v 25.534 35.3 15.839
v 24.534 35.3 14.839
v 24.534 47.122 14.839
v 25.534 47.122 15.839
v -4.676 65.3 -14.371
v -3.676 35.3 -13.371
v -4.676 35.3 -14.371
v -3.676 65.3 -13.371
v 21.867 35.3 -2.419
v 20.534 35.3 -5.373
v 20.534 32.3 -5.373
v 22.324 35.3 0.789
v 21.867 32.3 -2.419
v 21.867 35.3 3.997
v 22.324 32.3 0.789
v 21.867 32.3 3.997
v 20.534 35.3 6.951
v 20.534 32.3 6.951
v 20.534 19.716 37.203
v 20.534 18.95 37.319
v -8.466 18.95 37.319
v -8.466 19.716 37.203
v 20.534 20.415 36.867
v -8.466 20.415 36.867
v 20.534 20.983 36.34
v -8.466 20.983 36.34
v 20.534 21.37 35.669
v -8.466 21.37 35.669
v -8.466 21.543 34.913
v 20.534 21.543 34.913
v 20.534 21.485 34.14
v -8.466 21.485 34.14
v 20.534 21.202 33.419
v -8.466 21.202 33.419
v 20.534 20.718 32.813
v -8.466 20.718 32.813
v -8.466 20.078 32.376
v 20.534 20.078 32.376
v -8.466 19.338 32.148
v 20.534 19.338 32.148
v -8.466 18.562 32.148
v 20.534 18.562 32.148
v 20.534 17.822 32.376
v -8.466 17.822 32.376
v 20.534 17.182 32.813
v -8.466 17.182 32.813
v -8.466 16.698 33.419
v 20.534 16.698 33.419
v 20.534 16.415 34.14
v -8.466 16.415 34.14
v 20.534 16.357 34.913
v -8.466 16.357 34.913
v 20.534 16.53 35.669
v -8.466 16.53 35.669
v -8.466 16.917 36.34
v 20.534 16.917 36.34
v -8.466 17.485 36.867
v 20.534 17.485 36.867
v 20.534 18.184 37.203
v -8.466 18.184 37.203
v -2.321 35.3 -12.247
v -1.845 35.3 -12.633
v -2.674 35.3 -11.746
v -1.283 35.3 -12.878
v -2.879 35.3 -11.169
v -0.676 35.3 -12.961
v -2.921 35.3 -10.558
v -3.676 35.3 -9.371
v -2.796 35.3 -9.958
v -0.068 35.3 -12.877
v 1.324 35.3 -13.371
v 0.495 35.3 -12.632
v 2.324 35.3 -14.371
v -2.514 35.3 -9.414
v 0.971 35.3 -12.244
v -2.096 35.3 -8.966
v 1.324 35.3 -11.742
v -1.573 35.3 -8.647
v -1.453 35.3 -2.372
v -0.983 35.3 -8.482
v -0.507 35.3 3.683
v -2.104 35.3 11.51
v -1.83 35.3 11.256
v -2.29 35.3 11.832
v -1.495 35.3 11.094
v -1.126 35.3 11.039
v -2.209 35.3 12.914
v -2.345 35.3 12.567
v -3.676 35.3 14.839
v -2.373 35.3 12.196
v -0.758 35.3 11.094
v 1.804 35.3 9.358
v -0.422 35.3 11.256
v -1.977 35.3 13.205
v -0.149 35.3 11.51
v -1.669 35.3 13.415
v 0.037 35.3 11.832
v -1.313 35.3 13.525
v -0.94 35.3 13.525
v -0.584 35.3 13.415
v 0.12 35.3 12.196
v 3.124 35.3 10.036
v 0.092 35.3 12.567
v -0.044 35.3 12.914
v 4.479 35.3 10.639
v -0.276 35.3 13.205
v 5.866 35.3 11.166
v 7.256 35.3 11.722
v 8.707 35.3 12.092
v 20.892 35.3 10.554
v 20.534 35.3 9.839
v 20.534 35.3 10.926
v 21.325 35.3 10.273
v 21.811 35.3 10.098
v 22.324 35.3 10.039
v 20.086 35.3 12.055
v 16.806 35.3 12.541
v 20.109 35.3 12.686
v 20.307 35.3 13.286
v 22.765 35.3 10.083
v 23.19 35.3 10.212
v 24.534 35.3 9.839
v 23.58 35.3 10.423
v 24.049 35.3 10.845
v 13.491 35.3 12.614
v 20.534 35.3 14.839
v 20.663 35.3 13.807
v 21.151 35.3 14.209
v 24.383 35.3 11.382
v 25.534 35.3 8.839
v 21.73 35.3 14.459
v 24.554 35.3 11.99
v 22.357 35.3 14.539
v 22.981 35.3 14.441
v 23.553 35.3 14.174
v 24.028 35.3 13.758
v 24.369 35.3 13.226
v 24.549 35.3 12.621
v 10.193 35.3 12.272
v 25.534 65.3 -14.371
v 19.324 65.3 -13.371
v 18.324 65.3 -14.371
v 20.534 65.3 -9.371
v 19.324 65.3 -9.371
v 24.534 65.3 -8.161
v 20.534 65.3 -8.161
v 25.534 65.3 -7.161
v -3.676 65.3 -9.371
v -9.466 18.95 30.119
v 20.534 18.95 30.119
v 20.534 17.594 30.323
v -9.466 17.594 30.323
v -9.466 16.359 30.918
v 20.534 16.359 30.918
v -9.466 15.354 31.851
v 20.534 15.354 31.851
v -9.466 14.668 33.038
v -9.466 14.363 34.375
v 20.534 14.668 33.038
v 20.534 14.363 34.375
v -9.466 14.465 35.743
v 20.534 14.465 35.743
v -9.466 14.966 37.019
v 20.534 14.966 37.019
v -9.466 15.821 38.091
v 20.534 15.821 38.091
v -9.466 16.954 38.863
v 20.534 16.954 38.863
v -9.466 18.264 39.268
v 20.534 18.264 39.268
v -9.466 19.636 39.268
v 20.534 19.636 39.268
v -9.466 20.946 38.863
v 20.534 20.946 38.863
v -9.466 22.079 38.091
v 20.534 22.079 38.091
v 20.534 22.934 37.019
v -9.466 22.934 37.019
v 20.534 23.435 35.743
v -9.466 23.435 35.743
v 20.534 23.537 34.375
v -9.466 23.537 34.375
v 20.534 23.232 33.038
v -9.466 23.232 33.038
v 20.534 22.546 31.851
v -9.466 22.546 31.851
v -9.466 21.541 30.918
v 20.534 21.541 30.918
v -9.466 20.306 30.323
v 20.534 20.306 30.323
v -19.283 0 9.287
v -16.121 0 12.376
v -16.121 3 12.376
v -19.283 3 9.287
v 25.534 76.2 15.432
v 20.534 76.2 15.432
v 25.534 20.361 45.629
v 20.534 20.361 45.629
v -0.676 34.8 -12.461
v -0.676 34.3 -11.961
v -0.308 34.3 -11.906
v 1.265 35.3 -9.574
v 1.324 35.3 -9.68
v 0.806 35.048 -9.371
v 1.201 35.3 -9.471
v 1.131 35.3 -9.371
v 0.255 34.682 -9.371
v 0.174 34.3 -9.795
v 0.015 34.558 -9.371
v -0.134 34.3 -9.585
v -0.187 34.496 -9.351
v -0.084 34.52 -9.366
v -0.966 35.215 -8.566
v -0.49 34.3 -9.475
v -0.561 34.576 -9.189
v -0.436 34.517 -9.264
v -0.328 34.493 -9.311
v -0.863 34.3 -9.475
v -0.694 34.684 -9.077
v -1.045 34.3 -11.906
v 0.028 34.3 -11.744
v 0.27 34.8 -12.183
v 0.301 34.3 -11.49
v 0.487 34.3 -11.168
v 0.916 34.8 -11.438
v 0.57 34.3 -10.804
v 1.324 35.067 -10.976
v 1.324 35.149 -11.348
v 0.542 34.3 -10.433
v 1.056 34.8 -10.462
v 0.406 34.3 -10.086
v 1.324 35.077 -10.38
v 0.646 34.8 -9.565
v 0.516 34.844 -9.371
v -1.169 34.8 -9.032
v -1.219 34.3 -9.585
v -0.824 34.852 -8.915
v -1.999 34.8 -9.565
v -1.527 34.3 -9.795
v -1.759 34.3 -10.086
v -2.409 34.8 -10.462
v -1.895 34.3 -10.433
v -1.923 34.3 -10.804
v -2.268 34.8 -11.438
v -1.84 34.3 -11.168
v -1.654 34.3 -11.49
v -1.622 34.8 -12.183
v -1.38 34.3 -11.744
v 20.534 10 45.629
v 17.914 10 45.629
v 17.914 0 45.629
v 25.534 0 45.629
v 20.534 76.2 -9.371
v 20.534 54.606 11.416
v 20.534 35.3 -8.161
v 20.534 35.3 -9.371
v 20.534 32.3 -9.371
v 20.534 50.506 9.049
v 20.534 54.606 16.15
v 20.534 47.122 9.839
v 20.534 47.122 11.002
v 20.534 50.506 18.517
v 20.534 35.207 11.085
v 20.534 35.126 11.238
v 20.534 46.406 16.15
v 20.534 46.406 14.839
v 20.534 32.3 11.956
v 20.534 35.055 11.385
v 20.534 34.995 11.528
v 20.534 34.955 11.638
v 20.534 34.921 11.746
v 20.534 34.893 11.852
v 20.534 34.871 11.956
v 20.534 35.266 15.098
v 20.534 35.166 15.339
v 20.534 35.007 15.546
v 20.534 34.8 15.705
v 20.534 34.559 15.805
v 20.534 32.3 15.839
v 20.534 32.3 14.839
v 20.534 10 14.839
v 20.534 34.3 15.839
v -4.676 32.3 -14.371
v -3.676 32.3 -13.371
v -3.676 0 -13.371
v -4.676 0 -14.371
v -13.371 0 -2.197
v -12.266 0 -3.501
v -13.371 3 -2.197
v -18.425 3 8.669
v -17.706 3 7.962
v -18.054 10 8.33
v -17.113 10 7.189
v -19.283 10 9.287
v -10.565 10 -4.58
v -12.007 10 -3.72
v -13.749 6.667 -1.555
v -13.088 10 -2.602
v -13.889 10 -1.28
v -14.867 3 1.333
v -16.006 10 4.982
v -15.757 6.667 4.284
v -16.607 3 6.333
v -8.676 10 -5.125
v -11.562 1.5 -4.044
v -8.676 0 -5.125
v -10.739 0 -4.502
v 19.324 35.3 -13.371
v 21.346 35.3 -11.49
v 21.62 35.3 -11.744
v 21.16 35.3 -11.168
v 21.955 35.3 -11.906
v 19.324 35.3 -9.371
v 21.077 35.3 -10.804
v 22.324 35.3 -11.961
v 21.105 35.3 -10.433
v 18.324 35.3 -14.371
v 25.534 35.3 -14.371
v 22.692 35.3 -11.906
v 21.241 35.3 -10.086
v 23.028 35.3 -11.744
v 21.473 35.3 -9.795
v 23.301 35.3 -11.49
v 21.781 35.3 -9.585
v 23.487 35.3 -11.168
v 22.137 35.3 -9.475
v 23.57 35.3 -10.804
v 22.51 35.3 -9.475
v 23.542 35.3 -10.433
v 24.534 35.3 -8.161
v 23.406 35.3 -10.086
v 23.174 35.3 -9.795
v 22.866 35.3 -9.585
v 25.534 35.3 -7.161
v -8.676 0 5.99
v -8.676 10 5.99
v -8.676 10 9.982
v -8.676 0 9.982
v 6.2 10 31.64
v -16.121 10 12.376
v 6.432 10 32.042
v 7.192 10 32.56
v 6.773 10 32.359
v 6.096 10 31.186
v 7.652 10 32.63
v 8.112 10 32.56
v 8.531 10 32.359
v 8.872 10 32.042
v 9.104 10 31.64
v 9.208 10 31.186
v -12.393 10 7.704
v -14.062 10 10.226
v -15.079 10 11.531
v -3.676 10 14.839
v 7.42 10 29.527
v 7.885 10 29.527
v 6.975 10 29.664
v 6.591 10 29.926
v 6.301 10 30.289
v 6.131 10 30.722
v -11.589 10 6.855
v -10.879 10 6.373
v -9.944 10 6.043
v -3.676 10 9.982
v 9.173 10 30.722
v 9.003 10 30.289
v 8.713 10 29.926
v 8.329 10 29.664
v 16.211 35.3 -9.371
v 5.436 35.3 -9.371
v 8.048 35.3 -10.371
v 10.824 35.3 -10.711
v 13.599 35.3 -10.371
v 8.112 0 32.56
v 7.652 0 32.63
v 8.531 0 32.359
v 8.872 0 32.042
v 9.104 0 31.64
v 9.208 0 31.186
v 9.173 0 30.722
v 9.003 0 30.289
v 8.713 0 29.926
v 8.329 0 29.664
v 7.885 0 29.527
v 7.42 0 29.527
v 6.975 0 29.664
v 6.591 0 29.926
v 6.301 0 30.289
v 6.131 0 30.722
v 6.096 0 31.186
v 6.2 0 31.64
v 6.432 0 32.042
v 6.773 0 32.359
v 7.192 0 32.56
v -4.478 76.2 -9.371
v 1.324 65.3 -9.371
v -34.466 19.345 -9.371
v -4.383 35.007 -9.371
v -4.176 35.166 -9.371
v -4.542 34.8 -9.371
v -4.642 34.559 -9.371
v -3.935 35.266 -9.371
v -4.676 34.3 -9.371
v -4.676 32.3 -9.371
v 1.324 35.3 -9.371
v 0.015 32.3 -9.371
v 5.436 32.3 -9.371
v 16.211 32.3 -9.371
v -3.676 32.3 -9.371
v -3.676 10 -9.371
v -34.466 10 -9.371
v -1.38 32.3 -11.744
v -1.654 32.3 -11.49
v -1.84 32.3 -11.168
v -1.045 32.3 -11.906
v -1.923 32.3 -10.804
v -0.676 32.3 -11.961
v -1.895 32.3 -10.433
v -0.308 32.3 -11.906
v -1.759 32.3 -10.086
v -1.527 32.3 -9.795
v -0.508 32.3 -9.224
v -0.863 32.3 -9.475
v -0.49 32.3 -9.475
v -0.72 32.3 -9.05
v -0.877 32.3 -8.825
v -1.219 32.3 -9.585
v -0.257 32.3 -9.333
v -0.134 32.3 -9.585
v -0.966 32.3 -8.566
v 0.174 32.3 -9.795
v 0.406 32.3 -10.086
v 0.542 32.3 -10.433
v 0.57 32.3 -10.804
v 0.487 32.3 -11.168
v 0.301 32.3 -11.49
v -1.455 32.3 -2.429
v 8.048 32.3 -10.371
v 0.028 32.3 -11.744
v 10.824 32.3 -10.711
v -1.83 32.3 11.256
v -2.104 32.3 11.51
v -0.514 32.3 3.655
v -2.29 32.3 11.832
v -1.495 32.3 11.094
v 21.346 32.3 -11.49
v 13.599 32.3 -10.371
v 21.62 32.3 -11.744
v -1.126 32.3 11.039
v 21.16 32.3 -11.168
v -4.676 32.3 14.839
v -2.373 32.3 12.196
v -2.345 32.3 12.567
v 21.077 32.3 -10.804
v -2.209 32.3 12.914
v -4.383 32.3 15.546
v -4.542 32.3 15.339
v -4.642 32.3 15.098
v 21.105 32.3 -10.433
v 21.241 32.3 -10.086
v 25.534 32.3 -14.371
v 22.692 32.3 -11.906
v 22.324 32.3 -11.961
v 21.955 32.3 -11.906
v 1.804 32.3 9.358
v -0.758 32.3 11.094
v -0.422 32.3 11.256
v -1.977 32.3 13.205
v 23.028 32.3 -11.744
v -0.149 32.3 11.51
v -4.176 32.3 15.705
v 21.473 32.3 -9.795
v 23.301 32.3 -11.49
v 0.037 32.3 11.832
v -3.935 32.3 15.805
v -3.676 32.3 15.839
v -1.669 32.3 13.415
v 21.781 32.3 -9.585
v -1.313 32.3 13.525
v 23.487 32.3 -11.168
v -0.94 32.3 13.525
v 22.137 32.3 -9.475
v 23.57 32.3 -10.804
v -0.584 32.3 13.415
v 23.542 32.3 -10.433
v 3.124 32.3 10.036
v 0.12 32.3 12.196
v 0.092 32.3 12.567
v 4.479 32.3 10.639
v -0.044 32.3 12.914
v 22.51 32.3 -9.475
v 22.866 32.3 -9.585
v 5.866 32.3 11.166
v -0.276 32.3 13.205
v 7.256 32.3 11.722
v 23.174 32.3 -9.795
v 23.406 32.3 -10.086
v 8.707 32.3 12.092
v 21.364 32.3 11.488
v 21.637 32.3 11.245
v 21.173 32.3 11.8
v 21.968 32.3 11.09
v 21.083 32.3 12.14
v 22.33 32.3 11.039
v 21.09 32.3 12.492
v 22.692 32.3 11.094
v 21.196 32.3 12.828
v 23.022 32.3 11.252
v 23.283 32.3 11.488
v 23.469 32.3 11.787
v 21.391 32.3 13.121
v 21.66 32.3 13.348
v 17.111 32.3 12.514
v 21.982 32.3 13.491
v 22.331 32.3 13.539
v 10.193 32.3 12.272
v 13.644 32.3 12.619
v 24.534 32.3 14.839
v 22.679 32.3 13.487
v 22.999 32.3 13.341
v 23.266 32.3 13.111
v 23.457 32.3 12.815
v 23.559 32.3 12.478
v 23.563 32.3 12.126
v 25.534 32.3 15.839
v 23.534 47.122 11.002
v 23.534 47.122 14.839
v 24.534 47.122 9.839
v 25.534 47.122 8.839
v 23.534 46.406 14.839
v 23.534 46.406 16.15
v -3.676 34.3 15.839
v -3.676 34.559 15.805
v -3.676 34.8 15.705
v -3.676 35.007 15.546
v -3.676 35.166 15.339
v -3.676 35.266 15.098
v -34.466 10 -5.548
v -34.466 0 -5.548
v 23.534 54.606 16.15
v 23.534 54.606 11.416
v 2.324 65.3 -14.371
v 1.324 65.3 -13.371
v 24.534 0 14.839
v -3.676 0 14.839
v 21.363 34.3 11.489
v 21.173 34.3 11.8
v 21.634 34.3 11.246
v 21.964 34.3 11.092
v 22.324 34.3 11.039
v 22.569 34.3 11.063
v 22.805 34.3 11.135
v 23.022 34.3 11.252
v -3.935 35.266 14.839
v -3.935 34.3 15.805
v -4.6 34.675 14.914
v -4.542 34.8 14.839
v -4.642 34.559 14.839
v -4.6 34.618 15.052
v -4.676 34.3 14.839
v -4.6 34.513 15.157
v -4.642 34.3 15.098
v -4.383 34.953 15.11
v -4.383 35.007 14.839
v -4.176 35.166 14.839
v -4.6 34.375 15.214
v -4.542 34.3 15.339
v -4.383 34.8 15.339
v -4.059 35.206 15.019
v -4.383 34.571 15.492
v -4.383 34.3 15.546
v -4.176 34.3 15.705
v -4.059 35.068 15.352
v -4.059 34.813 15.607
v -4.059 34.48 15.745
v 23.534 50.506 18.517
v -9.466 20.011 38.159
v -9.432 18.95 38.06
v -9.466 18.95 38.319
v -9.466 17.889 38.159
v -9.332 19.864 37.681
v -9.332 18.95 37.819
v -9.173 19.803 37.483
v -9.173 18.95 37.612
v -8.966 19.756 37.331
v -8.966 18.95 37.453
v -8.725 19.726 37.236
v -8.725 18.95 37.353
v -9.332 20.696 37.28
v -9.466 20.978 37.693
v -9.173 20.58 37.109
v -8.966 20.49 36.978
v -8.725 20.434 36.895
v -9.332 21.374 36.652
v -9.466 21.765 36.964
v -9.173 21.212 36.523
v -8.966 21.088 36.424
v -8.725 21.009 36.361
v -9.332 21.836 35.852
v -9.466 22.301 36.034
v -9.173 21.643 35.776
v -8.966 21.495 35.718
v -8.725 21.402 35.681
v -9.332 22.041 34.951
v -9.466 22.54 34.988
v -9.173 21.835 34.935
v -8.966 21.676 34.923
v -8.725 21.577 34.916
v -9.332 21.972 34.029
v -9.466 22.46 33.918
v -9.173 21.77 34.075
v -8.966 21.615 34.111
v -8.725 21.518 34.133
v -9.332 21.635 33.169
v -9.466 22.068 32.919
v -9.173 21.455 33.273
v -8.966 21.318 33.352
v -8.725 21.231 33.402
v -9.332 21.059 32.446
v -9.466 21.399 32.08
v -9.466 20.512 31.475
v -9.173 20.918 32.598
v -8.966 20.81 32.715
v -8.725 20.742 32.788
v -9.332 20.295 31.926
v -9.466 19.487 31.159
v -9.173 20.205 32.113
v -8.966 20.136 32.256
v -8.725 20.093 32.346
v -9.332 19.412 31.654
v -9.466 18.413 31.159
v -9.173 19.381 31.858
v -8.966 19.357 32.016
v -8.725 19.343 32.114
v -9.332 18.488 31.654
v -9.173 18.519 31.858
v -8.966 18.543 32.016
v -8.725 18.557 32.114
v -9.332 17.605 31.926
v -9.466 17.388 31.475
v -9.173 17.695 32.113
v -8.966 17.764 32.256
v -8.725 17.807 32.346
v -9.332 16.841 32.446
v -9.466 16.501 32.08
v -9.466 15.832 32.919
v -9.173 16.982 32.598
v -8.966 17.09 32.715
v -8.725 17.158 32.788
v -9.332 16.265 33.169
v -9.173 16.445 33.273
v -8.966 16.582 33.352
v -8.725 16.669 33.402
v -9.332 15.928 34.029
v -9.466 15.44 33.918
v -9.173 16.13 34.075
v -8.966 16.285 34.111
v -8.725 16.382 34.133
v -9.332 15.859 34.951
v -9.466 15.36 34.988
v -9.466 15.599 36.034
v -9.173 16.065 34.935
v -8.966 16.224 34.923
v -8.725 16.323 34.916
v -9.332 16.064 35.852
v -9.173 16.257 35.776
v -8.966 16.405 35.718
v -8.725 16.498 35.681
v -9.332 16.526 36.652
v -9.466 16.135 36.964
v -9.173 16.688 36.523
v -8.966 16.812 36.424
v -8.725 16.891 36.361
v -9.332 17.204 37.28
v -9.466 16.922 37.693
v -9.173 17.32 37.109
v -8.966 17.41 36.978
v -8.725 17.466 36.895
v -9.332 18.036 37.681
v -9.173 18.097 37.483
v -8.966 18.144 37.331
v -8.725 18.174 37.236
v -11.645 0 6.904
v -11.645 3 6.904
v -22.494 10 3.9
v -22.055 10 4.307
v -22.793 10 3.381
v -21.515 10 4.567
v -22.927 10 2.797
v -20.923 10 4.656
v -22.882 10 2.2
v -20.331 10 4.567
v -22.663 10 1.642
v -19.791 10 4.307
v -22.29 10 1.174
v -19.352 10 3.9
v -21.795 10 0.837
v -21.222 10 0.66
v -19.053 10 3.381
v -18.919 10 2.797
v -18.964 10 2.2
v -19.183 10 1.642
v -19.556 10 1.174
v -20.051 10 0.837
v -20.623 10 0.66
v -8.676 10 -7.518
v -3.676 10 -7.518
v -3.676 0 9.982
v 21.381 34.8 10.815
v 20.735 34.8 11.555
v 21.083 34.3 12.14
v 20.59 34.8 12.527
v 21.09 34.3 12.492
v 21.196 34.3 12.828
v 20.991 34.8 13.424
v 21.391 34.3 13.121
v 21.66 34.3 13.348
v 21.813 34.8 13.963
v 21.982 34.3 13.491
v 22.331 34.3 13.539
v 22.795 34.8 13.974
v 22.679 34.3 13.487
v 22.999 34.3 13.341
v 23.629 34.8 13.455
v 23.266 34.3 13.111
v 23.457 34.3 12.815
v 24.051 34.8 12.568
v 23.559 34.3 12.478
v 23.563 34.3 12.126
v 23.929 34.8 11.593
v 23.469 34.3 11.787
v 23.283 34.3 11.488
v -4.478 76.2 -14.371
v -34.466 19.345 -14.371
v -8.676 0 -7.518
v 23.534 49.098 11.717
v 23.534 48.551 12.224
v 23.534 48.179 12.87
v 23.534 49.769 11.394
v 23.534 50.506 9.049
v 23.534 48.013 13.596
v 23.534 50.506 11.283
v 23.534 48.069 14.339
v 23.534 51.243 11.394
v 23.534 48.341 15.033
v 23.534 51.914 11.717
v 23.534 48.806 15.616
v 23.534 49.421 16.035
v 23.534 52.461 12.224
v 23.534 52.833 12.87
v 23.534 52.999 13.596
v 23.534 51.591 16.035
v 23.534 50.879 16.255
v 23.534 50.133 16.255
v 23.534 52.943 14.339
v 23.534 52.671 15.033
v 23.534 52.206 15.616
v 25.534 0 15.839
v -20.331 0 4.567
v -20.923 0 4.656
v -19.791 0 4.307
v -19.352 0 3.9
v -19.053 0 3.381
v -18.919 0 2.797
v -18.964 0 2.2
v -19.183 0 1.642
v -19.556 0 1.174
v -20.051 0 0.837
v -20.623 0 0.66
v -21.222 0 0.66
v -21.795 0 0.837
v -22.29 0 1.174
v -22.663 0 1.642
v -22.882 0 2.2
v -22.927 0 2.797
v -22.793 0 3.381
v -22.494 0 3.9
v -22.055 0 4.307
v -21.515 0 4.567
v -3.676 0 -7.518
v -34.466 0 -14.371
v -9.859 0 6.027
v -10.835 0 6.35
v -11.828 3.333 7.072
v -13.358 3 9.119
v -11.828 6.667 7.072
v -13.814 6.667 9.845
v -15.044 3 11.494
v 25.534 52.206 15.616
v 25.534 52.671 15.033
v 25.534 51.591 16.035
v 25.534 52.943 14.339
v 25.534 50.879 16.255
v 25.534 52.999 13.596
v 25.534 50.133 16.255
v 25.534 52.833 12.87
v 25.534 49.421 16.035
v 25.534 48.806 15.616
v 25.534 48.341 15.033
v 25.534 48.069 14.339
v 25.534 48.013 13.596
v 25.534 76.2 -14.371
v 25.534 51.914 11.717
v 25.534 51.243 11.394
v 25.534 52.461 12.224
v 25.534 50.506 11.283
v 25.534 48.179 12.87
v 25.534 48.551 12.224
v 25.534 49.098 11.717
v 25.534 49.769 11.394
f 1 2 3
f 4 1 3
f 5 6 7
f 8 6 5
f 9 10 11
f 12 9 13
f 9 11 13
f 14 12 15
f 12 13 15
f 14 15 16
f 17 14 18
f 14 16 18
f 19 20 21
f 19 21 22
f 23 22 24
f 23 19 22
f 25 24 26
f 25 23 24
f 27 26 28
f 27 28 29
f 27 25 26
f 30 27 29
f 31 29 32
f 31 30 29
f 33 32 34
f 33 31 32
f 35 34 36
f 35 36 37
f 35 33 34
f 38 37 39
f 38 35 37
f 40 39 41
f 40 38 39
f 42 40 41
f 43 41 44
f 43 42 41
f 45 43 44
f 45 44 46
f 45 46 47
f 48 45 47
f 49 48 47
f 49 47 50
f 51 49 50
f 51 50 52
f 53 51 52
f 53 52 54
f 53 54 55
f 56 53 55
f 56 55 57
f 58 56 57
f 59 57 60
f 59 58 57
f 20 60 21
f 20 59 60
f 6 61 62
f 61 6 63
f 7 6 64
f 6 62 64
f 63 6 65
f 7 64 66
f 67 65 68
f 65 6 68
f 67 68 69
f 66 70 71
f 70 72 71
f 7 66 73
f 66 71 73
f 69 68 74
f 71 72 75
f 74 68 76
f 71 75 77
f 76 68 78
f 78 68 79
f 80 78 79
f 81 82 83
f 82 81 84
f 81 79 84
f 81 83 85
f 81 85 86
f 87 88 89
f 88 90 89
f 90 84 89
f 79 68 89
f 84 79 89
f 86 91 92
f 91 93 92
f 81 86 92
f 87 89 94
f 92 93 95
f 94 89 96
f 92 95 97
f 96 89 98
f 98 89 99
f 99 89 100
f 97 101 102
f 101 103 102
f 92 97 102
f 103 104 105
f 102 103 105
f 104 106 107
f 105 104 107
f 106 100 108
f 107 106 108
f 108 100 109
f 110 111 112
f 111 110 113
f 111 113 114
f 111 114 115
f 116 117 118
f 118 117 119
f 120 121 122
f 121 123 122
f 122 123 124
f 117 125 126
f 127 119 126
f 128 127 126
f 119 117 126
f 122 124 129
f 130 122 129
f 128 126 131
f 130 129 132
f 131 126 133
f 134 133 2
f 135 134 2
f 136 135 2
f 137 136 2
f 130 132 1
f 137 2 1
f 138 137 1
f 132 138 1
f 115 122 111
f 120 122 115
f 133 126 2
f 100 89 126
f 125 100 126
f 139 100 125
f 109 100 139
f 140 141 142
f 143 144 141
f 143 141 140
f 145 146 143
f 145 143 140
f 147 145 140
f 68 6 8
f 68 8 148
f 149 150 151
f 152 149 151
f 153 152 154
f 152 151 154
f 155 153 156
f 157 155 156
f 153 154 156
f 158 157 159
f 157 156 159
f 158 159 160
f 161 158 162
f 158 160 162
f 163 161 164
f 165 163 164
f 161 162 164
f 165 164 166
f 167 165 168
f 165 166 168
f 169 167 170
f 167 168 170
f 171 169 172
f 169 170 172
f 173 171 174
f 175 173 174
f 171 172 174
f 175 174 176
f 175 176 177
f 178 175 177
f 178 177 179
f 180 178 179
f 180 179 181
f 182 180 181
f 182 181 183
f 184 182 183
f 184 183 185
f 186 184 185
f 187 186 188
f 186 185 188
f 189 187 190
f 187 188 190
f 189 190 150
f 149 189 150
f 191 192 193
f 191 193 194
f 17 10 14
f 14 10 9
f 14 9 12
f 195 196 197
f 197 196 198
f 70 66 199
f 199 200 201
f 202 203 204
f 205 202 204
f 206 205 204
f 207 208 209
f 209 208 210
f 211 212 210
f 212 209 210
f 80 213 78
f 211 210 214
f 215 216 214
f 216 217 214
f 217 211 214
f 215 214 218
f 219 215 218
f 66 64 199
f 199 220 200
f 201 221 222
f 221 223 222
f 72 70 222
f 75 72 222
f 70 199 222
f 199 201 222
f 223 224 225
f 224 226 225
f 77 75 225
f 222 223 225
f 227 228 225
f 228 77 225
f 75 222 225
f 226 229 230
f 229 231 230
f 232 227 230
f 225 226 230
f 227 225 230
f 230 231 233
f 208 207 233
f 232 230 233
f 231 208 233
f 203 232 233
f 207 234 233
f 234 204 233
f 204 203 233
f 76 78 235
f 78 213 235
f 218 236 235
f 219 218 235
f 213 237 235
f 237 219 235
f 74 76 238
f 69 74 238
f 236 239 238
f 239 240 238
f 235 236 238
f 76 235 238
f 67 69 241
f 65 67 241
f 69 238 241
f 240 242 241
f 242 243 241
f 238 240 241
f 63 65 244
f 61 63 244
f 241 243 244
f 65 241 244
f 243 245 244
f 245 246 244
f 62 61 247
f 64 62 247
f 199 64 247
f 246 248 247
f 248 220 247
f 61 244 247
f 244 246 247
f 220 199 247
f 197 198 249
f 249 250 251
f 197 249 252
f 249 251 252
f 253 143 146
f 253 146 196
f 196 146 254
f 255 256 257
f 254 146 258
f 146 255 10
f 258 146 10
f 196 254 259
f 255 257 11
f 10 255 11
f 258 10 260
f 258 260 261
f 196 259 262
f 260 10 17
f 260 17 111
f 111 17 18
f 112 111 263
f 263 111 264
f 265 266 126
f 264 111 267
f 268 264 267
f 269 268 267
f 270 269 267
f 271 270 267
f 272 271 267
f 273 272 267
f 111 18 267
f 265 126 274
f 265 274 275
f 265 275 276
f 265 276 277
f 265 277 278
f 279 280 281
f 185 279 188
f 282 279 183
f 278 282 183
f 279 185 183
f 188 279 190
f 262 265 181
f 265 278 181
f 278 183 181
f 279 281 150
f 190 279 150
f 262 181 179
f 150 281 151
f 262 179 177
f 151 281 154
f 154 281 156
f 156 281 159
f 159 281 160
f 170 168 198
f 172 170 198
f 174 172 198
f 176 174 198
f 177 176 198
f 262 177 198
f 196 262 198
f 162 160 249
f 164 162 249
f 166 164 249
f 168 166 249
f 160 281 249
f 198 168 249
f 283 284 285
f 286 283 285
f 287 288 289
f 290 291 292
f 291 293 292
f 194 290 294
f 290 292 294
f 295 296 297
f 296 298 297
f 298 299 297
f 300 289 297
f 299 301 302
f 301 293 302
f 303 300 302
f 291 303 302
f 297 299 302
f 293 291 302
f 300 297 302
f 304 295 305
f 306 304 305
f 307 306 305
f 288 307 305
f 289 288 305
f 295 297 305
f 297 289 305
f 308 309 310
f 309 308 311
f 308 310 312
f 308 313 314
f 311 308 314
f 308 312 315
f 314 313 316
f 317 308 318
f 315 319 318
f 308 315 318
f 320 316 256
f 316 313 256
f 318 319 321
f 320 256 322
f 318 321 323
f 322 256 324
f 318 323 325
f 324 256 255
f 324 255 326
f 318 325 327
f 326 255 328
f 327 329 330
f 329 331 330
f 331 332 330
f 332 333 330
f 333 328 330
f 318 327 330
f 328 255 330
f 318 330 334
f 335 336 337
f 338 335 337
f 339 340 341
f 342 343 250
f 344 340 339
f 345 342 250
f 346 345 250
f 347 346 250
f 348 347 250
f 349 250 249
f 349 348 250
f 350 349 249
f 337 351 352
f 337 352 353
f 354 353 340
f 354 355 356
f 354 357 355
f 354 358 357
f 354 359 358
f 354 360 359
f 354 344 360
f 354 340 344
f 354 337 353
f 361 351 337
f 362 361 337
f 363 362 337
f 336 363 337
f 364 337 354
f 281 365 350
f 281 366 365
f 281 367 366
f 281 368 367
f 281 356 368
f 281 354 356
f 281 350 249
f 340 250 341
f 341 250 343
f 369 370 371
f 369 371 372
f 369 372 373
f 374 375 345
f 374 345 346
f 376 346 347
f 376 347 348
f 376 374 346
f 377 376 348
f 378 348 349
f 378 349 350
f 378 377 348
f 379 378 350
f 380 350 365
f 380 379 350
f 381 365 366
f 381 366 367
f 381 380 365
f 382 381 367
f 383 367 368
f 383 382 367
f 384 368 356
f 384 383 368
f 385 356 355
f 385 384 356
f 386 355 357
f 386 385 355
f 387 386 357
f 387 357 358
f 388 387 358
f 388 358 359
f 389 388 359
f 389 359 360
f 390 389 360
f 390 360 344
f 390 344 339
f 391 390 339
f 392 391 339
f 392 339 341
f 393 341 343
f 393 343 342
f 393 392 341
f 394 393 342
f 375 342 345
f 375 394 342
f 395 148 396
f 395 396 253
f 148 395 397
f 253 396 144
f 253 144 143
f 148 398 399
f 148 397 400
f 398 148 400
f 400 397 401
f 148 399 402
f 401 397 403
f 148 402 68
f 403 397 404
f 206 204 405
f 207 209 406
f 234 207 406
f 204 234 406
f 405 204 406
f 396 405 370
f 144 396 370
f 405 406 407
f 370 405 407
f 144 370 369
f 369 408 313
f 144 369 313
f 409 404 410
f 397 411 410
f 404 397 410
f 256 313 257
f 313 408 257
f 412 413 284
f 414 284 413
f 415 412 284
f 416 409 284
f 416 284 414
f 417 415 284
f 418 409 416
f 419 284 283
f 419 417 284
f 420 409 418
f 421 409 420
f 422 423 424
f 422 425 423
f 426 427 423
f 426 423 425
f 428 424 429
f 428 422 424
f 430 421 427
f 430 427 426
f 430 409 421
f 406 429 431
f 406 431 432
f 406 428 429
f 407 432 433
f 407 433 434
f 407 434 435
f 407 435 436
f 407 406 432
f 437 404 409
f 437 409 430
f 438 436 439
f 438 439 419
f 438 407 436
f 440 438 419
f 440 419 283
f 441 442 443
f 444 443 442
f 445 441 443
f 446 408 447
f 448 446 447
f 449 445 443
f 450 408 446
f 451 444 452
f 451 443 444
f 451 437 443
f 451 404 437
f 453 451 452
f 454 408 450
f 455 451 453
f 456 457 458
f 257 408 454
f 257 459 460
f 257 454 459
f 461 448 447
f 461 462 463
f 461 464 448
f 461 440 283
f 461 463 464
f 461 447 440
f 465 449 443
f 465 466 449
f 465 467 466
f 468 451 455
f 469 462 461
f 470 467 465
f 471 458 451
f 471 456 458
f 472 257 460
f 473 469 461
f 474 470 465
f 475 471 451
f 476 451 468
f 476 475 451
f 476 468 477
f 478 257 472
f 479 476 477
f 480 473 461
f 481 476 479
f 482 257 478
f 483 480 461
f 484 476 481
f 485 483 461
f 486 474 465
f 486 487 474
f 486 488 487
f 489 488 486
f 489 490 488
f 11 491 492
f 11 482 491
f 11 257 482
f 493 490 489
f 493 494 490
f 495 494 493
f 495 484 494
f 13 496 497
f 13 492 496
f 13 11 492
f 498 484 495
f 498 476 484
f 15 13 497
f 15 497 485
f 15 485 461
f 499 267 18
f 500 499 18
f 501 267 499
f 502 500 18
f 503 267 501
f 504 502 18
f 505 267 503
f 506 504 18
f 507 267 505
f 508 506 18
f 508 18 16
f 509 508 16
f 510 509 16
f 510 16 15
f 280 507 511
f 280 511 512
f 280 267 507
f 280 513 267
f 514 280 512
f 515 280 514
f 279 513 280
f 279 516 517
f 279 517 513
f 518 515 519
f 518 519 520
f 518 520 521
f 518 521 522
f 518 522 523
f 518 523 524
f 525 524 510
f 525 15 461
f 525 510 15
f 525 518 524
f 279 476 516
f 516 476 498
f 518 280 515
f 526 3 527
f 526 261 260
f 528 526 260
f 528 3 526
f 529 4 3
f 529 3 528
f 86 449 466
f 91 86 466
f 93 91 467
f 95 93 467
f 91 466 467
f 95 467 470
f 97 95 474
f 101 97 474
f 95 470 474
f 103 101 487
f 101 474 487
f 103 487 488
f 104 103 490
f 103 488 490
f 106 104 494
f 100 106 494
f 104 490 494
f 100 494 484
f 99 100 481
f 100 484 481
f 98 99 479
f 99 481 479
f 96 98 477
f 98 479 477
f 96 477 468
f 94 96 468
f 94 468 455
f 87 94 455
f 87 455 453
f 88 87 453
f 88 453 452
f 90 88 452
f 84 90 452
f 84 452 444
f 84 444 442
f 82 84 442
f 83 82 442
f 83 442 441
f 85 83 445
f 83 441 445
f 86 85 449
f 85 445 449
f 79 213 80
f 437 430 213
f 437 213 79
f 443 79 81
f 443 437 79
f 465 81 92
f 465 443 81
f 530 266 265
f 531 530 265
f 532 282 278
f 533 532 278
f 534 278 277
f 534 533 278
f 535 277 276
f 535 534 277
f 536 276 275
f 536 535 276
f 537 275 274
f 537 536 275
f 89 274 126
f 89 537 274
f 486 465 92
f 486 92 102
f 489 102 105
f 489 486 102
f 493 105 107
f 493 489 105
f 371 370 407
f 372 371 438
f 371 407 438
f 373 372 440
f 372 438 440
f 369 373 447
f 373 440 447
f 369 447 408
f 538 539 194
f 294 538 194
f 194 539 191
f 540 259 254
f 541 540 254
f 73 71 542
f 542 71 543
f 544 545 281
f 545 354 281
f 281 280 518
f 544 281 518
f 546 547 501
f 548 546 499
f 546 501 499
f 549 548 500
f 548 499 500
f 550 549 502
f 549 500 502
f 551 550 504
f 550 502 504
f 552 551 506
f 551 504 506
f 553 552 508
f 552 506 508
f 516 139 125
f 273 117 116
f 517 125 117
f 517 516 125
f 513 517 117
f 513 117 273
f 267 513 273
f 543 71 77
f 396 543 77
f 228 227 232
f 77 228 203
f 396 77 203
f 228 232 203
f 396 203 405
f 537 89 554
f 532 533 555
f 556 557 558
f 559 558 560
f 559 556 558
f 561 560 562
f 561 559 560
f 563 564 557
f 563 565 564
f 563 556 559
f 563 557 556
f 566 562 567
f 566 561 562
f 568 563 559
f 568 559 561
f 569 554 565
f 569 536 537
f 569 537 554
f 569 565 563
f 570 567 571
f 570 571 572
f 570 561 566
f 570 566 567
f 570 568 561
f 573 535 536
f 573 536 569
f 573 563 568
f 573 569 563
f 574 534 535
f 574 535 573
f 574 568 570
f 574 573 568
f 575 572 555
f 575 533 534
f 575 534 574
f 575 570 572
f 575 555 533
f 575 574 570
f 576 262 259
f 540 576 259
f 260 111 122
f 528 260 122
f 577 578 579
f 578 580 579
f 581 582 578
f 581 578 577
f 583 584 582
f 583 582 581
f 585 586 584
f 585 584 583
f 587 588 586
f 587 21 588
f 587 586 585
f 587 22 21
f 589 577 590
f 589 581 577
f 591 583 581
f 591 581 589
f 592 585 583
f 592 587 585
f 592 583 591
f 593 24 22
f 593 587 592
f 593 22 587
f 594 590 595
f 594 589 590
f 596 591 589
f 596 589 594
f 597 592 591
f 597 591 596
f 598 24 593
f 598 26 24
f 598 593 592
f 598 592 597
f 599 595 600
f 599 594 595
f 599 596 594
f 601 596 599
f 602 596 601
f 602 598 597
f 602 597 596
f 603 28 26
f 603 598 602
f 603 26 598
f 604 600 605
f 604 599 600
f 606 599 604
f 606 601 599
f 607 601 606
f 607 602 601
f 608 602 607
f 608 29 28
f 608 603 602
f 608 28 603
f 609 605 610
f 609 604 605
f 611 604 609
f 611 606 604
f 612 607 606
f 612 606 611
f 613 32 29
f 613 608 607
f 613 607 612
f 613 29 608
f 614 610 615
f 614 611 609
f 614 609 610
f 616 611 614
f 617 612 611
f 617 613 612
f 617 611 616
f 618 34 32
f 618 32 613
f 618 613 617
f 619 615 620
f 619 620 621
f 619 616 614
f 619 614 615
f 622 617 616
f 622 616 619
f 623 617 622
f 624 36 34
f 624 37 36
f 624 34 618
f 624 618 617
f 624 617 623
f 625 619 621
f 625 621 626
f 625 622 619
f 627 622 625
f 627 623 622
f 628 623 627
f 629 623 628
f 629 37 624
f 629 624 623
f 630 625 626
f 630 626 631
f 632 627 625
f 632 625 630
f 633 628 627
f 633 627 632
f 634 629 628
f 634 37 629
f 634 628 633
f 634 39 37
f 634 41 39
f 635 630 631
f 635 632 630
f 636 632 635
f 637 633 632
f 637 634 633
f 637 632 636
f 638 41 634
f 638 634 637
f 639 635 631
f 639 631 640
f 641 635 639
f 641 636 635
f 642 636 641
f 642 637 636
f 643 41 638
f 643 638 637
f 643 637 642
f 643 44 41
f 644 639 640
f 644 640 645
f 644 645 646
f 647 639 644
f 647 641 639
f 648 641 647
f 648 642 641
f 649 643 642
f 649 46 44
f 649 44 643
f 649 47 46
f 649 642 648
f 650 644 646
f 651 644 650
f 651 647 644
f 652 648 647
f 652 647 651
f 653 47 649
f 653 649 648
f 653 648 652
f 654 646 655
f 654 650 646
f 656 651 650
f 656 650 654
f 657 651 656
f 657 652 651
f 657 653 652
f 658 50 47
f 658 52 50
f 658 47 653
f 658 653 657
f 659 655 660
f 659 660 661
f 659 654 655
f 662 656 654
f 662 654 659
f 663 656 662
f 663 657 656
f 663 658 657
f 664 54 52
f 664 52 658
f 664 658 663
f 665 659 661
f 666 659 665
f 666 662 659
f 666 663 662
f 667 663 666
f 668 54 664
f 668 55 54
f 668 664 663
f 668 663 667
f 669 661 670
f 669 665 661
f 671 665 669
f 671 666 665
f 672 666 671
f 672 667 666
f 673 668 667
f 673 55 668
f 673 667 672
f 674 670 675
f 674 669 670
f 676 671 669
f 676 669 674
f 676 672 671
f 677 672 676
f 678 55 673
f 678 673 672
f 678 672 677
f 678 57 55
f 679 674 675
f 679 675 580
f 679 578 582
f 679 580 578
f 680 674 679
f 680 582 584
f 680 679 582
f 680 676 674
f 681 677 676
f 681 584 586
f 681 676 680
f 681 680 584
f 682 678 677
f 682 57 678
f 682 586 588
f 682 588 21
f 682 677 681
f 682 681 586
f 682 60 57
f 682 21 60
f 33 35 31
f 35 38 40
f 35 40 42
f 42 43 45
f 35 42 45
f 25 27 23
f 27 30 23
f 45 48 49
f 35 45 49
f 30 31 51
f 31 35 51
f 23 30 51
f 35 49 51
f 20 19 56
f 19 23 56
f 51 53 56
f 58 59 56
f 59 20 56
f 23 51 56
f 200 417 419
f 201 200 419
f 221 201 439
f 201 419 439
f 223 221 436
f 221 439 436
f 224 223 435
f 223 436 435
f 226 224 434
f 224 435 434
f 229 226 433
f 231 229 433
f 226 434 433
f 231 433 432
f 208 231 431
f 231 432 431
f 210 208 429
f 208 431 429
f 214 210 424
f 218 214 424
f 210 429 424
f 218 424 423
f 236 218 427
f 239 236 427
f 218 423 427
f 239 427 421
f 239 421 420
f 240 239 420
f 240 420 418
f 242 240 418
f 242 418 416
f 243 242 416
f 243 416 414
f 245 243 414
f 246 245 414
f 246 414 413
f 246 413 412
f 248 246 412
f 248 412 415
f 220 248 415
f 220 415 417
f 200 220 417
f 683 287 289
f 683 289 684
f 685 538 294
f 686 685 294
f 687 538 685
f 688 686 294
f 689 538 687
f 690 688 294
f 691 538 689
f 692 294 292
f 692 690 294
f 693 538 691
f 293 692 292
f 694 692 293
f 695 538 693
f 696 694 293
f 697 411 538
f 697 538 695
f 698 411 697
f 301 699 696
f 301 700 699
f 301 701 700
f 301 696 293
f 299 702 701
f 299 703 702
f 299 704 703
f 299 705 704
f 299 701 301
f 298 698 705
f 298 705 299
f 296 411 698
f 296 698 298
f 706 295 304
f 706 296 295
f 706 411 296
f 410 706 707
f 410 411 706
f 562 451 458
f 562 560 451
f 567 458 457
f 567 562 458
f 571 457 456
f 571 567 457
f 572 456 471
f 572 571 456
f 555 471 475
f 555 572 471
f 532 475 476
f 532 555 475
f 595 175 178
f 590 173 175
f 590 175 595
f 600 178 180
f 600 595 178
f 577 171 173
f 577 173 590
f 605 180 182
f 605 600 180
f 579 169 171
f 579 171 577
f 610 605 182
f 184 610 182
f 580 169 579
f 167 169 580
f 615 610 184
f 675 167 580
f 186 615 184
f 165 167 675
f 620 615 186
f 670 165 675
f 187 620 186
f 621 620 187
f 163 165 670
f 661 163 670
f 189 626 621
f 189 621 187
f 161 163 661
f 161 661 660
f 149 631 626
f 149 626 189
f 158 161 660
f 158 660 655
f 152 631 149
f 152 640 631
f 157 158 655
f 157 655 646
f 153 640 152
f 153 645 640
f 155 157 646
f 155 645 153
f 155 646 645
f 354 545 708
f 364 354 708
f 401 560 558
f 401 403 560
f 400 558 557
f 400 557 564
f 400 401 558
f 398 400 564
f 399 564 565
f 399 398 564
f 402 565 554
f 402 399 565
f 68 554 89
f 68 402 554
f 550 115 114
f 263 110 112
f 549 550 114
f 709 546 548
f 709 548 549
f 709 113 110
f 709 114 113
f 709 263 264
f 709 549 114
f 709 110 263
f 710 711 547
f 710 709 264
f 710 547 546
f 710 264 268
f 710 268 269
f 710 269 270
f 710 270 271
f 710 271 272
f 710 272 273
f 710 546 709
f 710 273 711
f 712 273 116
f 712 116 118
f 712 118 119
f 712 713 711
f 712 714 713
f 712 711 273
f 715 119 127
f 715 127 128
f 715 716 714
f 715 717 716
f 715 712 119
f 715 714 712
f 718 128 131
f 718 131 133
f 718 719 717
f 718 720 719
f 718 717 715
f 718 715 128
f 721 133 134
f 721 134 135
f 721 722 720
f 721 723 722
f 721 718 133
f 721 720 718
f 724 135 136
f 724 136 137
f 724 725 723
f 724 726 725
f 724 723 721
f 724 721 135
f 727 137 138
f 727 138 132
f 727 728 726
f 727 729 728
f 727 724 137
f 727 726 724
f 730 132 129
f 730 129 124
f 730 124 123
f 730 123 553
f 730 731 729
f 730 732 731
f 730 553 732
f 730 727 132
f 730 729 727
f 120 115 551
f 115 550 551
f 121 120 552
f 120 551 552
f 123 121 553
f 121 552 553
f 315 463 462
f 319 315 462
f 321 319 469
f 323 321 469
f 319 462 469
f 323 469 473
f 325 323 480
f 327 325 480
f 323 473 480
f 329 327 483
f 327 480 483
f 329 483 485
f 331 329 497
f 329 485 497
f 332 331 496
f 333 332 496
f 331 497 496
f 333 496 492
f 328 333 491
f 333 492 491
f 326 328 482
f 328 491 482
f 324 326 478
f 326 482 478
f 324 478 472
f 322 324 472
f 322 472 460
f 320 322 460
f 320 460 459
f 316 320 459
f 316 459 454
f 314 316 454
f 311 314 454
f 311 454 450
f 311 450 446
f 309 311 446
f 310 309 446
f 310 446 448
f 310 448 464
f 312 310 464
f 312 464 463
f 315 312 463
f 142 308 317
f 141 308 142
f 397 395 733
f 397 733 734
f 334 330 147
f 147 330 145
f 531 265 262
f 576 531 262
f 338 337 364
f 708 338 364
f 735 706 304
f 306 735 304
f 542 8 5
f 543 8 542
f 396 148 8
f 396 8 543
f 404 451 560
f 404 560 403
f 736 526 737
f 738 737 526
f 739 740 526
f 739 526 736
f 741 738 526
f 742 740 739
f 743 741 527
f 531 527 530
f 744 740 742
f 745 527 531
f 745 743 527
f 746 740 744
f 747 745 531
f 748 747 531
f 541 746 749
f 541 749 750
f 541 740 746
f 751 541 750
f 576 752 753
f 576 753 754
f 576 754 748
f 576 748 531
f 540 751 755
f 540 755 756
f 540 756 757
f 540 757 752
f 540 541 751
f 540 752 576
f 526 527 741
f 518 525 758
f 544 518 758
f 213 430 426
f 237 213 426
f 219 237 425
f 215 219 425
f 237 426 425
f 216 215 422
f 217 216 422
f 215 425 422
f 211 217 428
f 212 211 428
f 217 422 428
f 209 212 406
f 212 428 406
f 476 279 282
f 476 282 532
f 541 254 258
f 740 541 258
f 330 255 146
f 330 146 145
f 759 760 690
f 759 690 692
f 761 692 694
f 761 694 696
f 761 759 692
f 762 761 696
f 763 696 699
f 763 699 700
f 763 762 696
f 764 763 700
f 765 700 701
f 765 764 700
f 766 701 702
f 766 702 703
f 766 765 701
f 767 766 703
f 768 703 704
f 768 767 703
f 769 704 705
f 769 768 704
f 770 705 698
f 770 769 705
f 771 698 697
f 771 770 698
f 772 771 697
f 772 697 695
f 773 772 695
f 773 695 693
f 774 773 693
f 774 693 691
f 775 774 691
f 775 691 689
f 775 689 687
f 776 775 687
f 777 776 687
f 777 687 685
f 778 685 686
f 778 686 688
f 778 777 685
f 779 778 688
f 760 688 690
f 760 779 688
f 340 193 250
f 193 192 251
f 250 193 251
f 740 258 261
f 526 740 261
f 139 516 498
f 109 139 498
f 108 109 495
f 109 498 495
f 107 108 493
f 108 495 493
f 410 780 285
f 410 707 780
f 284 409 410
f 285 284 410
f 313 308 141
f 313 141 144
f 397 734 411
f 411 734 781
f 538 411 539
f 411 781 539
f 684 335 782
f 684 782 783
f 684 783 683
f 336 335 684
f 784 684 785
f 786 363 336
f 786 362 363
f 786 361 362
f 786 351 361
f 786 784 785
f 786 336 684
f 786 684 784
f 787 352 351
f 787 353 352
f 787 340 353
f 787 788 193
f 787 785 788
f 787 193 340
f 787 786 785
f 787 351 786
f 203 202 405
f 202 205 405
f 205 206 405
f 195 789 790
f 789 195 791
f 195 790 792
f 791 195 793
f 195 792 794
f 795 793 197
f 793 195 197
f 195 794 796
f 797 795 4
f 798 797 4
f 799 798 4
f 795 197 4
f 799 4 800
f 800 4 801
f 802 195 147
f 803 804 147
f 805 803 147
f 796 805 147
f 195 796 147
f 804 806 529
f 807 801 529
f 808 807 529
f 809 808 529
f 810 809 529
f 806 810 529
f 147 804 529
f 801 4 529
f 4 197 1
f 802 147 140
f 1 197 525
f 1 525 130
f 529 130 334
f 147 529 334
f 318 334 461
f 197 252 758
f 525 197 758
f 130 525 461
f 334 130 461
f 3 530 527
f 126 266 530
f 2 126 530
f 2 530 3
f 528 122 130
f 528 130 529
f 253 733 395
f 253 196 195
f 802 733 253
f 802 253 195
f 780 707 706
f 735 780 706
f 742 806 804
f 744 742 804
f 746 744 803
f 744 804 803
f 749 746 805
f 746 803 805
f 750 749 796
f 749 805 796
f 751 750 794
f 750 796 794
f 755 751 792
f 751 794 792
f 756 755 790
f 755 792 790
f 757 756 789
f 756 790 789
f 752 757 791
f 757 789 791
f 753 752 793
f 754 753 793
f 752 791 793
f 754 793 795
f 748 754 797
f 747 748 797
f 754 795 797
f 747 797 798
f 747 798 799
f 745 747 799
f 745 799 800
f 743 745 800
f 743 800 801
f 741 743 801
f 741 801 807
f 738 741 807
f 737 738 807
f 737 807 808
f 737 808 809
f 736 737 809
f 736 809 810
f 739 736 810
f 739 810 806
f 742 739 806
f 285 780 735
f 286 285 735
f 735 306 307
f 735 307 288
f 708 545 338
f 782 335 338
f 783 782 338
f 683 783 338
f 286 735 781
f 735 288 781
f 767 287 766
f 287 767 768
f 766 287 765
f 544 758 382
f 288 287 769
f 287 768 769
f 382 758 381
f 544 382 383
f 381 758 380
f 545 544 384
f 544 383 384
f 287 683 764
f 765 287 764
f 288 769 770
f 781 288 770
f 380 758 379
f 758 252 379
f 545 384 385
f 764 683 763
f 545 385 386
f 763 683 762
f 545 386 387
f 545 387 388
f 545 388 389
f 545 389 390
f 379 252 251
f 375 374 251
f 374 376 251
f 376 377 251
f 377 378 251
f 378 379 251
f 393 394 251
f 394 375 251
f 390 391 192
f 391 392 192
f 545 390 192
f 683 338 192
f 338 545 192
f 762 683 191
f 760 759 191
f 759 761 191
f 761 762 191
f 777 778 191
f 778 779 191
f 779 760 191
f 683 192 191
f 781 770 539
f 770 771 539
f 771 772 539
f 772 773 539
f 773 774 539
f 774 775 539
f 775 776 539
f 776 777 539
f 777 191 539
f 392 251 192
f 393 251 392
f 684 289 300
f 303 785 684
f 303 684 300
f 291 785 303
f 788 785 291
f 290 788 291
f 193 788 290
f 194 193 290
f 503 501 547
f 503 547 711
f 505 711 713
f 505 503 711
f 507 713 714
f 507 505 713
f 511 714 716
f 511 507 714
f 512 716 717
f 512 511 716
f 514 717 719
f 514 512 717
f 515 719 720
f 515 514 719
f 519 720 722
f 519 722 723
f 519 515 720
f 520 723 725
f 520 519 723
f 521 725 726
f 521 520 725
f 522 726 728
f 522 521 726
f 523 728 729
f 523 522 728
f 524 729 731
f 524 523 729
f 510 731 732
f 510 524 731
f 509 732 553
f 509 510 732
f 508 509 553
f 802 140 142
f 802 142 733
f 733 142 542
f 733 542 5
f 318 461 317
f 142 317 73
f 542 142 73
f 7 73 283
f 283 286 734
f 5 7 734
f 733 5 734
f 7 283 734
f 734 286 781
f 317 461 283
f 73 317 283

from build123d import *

# Parameters (mm, degrees)
SKETCH1_R                      = 1.560106864
SKETCH1_R_2                    = 2.009221825
BOSS_EXTRUDE1_DEPTH            = 10
BOSS_EXTRUDE3_START            = -10
BOSS_EXTRUDE3_DEPTH            = 76.2
CUT_EXTRUDE1_REACH             = 89.478
SKETCH4_W                      = 29.21
SKETCH4_H                      = 29.21
CUT_EXTRUDE1_DIRECTION_2_DEPTH = 22.3
CUT_EXTRUDE2_START             = -3
SKETCH5_W                      = 6.21
SKETCH5_H                      = 5
SKETCH5_W_2                    = 5
SKETCH5_H_2                    = 6.21
CUT_EXTRUDE2_DEPTH             = 30
CUT_EXTRUDE3_REACH             = 74.091
SKETCH6_R                      = 1.25
CHAMFER1_SIZE                  = 1
CUT_EXTRUDE4_REACH             = 102.097
CUT_EXTRUDE5_REACH             = 106.467
SKETCH9_R                      = 1.25
BOSS_EXTRUDE4_DEPTH            = 3
FILLET2_R                      = 1
SKETCH10_R                     = 11.5
CUT_EXTRUDE6_DEPTH             = 3
SKETCH12_R                     = 4.6
SKETCH12_R_2                   = 2.6
BOSS_EXTRUDE5_DEPTH            = 30
FILLET3_R                      = 1
CHAMFER2_SIZE                  = 1
BOSS_EXTRUDE6_REACH            = 109.184
SKETCH14_W                     = 12.395863616
SKETCH14_H                     = 18.726756054
SKETCH13_R                     = 2.5
CUT_EXTRUDE7_DEPTH             = 20
CUT_EXTRUDE8_DEPTH             = 3
CUT_EXTRUDE11_DEPTH            = 10
BOSS_EXTRUDE8_DEPTH            = 3


with BuildPart() as part:
    # Sketch1 → Boss-Extrude1 (new body)
    with BuildSketch(Plane(origin=(0, 0, 0), x_dir=(1, 0, 0), z_dir=(0, 1, 0))):
        Polygon((-34.466315789, 14.371052632), (-34.466315789, 5.547894737), (17.913684211, -45.628947368), (25.533684211, -45.628947368), (25.533684211, 14.371052632), align=None)
        with Locations(Location((7.652084211, -31.069547368, 0), (0, 0, 270))):
            Circle(SKETCH1_R, mode=Mode.SUBTRACT)
        with Locations(Location((-20.922915789, -2.646947368, 0), (0, 0, 270))):
            Circle(SKETCH1_R_2, mode=Mode.SUBTRACT)
    extrude(amount=BOSS_EXTRUDE1_DEPTH)

    # Sketch3 → Boss-Extrude3 (add)
    with BuildSketch(Plane(origin=(0, 10, 0), x_dir=(1, 0, 0), z_dir=(0, 1, 0)).offset(BOSS_EXTRUDE3_START)):
        Polygon((-34.466315789, 14.371052632), (-34.466315789, 9.371052632), (20.533684211, 9.371052632), (20.533684211, -45.628947368), (25.533684211, -45.628947368), (25.533684211, 14.371052632), align=None)
    extrude(amount=BOSS_EXTRUDE3_DEPTH)

    # Sketch4 → Cut-Extrude1 (cut, up to next)
    with BuildSketch(Plane(origin=(0, 10, 0), x_dir=(1, 0, 0), z_dir=(0, 1, 0)), mode=Mode.PRIVATE) as cut_extrude1_sk1:
        with Locations((10.928684211, -0.233947368)):
            Rectangle(SKETCH4_W, SKETCH4_H)
    cut_extrude1_tool1 = extrude(cut_extrude1_sk1.sketch, amount=-CUT_EXTRUDE1_REACH, mode=Mode.PRIVATE) & part.part
    add(cut_extrude1_tool1.solids().sort_by_distance((10.928684, 10, 0.233947))[0], mode=Mode.SUBTRACT)

    # Sketch4 → Cut-Extrude1 direction 2 (cut)
    with BuildSketch(Plane(origin=(0, 10, 0), x_dir=(1, 0, 0), z_dir=(0, 1, 0))):
        with Locations((10.928684211, -0.233947368)):
            Rectangle(SKETCH4_W, SKETCH4_H)
    extrude(amount=CUT_EXTRUDE1_DIRECTION_2_DEPTH, mode=Mode.SUBTRACT)

    # Sketch5 → Cut-Extrude2 (cut)
    with BuildSketch(Plane.XZ.offset(-32.3).offset(CUT_EXTRUDE2_START)):
        with Locations((22.428684211, 12.338947368)):
            Rectangle(SKETCH5_W, SKETCH5_H)
        with Locations((-1.176315789, -11.266052632)):
            Rectangle(SKETCH5_W_2, SKETCH5_H_2)
        with Locations((22.428684211, -11.266052632)):
            Rectangle(SKETCH5_W, SKETCH5_H_2)
    extrude(amount=-CUT_EXTRUDE2_DEPTH, mode=Mode.SUBTRACT)

    # Sketch6 → Cut-Extrude3 (cut, up to next)
    with BuildSketch(Plane.XZ.offset(-32.3), mode=Mode.PRIVATE) as cut_extrude3_sk1:
        with Locations(Location((22.323684211, 12.288947368, 0), (0, 0, 270))):
            Circle(SKETCH6_R)
    cut_extrude3_tool1 = extrude(cut_extrude3_sk1.sketch, amount=-CUT_EXTRUDE3_REACH, mode=Mode.PRIVATE) & part.part
    # Sketch6 → Cut-Extrude3 (cut, up to next)
    with BuildSketch(Plane.XZ.offset(-32.3), mode=Mode.PRIVATE) as cut_extrude3_sk2:
        with Locations(Location((22.323684211, -10.711052632, 0), (0, 0, 270))):
            Circle(SKETCH6_R)
    cut_extrude3_tool2 = extrude(cut_extrude3_sk2.sketch, amount=-CUT_EXTRUDE3_REACH, mode=Mode.PRIVATE) & part.part
    # Sketch6 → Cut-Extrude3 (cut, up to next)
    with BuildSketch(Plane.XZ.offset(-32.3), mode=Mode.PRIVATE) as cut_extrude3_sk3:
        with Locations(Location((-0.676315789, -10.711052632, 0), (0, 0, 270))):
            Circle(SKETCH6_R)
    cut_extrude3_tool3 = extrude(cut_extrude3_sk3.sketch, amount=-CUT_EXTRUDE3_REACH, mode=Mode.PRIVATE) & part.part
    add(cut_extrude3_tool1.solids().sort_by_distance((22.323684, 32.3, 12.288947))[0], mode=Mode.SUBTRACT)
    add(cut_extrude3_tool2.solids().sort_by_distance((22.323684, 32.3, -10.711053))[0], mode=Mode.SUBTRACT)
    add(cut_extrude3_tool3.solids().sort_by_distance((-0.676316, 32.3, -10.711053))[0], mode=Mode.SUBTRACT)

    # Chamfer1
    chamfer1_edges = [part.edges().sort_by_distance(p)[0] for p in [
        (19.323684211, 50.3, -14.371052632),
        (25.533684211, 50.3, -8.161052632),
        (-3.676315789, 50.3, -14.371052632),
        (1.323684211, 50.3, -14.371052632),
        (25.533684211, 16.15, 14.838947368),
        (-3.676315789, 16.15, -14.371052632),
        (25.533684211, 50.3, 9.838947368),
        (25.533684211, 50.3, 14.838947368),
    ]]
    chamfer(chamfer1_edges, length=CHAMFER1_SIZE)

    # Sketch7 → Cut-Extrude4 (cut, up to next)
    with BuildSketch(Plane.XY.offset(-9.371052632), mode=Mode.PRIVATE) as cut_extrude4_sk1:
        Polygon((-4.478138481, 76.2), (-34.466315789, 19.345490892), (-34.466315789, 76.2), align=None)
    cut_extrude4_tool1 = extrude(cut_extrude4_sk1.sketch, amount=-CUT_EXTRUDE4_REACH, mode=Mode.PRIVATE) & part.part
    add(cut_extrude4_tool1.solids().sort_by_distance((-24.470257, 57.248497, -9.371053))[0], mode=Mode.SUBTRACT)

    # Sketch8 → Cut-Extrude5 (cut, up to next)
    with BuildSketch(Plane.ZY.offset(-20.533684211), mode=Mode.PRIVATE) as cut_extrude5_sk1:
        Polygon((45.628947368, 76.2), (15.432121686, 76.2), (45.628947368, 20.360875822), align=None)
    cut_extrude5_tool1 = extrude(cut_extrude5_sk1.sketch, amount=-CUT_EXTRUDE5_REACH, mode=Mode.PRIVATE) & part.part
    add(cut_extrude5_tool1.solids().sort_by_distance((20.533684, 57.586959, 35.563339))[0], mode=Mode.SUBTRACT)

    # Sketch9 → Boss-Extrude4 (add)
    with BuildSketch(Plane.XZ.offset(-32.3)):
        with BuildLine():
            Line((-4.676315789, 15.838947368), (-4.676315789, -14.371052632))
            Line((-4.676315789, -14.371052632), (0.900761385, -14.371052632))
            ThreePointArc((0.900761385, -14.371052632), (0.366362818, -13.109171958), (-0.102099011, -11.821356685))
            ThreePointArc((-0.102099011, -11.821356685), (-1.878735883, -11.052645838), (-0.771600032, -9.464689557))
            ThreePointArc((-0.771600032, -9.464689557), (-1.228222209, 0.185593043), (1.804207587, 9.358423992))
            ThreePointArc((1.804207587, 9.358423992), (11.255772005, 12.427491579), (21.173303455, 11.799944181))
            ThreePointArc((21.173303455, 11.799944181), (22.678913505, 13.487409779), (23.021780943, 11.252047686))
            ThreePointArc((23.021780943, 11.252047686), (24.290349599, 10.788966069), (25.533684211, 10.261870194))
            Line((25.533684211, 10.261870194), (25.533684211, 15.838947368))
            Line((25.533684211, 15.838947368), (-4.676315789, 15.838947368))
        make_face()
        with Locations(Location((-1.126315789, 12.288947368, 0), (0, 0, 270))):
            Circle(SKETCH9_R, mode=Mode.SUBTRACT)
    extrude(amount=-BOSS_EXTRUDE4_DEPTH)

    # Fillet2
    fillet2_edges = [part.edges().sort_by_distance(p)[0] for p in [
        (7.928684211, 35.3, 15.838947368),
        (-4.676315789, 35.3, 3.233947368),
        (-4.676315789, 33.8, 15.838947368),
        (-0.793400855, 33.8, -9.371052632),
    ]]
    fillet(fillet2_edges, radius=FILLET2_R)

    # Sketch10 → Cut-Extrude6 (cut)
    with BuildSketch(Plane.XZ.offset(-32.3)):
        with Locations((10.823684211, 0.788947368)):
            Circle(SKETCH10_R)
    extrude(amount=-CUT_EXTRUDE6_DEPTH, mode=Mode.SUBTRACT)

    # Sketch12 → Boss-Extrude5 (add)
    with BuildSketch(Plane.ZY.offset(-20.533684211)):
        with Locations(Location((34.718947368, 18.95, 0), (0, 0, 180))):
            Circle(SKETCH12_R)
        with Locations((34.718947368, 18.95)):
            Circle(SKETCH12_R_2, mode=Mode.SUBTRACT)
    extrude(amount=BOSS_EXTRUDE5_DEPTH)

    # Fillet3
    fillet3_edges = [part.edges().sort_by_distance(p)[0] for p in [
        (-9.466315789, 18.95, 32.118947368),
    ]]
    fillet(fillet3_edges, radius=FILLET3_R)

    # Chamfer2
    # the kernel refuses this chamfer: 1 mm, written as the material it takes off along each edge
    with BuildSketch(Plane(origin=(22.323684211, 35.3, 12.288947368), x_dir=(-0.9203046044214335, 0, -0.3912025499414705), z_dir=(0.3912025499414705, 0, -0.9203046044214335))) as chamfer2_piece_1:
        Polygon((1.25 + CHAMFER2_SIZE, 0), (1.25, -CHAMFER2_SIZE), (1.25, 0), align=None)
    revolve(axis=Axis((22.323684211, 35.3, 12.288947368), (0, 1, 0)), revolution_arc=259.078782156, mode=Mode.SUBTRACT)
    with BuildSketch(Plane(origin=(-0.676315789, 35.3, -10.711052632), x_dir=(0, 0, -1), z_dir=(-1, 0, 0))) as chamfer2_piece_2_section:
        Polygon((1.25 + CHAMFER2_SIZE, 0), (1.25, CHAMFER2_SIZE), (1.25, 0), align=None)
    chamfer2_piece_2 = revolve(axis=Axis((-0.676315789, 35.3, -10.711052632), (0, -1, 0)), mode=Mode.PRIVATE)
    chamfer2_piece_2 = split(chamfer2_piece_2, bisect_by=Plane(origin=(1.323684211, 34.812414485, -8.973467116), z_dir=(-1, 0, 0)), keep=Keep.TOP, mode=Mode.PRIVATE)
    add(chamfer2_piece_2, mode=Mode.SUBTRACT)
    with BuildSketch(Plane(origin=(22.323684211, 35.3, 12.288947368), x_dir=(-0.920304604421433, 0, -0.39120254994147174), z_dir=(-0.39120254994147174, 0, 0.920304604421433))) as chamfer2_piece_3:
        Polygon((1.25 + CHAMFER2_SIZE, 0), (1.25, CHAMFER2_SIZE), (1.25, 0), align=None)
    revolve(axis=Axis((22.323684211, 35.3, 12.288947368), (0, -1, 0)), revolution_arc=66.970653716, mode=Mode.SUBTRACT)
    with BuildSketch(Plane(origin=(22.323684211, 35.3, 12.288947368), x_dir=(0, 0, -1), z_dir=(-1, 0, 0))) as chamfer2_piece_4:
        Polygon((1.25 + CHAMFER2_SIZE, 0), (1.25, CHAMFER2_SIZE), (1.25, 0), align=None)
    revolve(axis=Axis((22.323684211, 35.3, 12.288947368), (0, -1, 0)), revolution_arc=33.950564129, mode=Mode.SUBTRACT)

    # Boss-Extrude6: up to this face of the body (flat: up to its plane)
    boss_extrude6_end = Plane(part.part.faces().sort_by_distance((20.533684211, 43.280549831, 15.597165562))[0])
    # Sketch14 → Boss-Extrude6 (add, up to the picked face)
    with BuildSketch(Plane(origin=(25.533684211, 0, 0), x_dir=(0, 0, -1), z_dir=(1, 0, 0)), mode=Mode.PRIVATE) as boss_extrude6_sk1:
        with Locations((-13.255996287, 56.485629394)):
            Rectangle(SKETCH14_W, SKETCH14_H)
    boss_extrude6_tool1 = split(extrude(boss_extrude6_sk1.sketch, amount=-BOSS_EXTRUDE6_REACH, mode=Mode.PRIVATE), bisect_by=boss_extrude6_end, keep=Keep.BOTH, mode=Mode.PRIVATE)
    add(boss_extrude6_tool1.solids().sort_by(Axis((25.533684, 56.485629, 13.255996), (-1, 0, 0)))[0])

    # Sketch13 → Cut-Extrude7 (cut)
    with BuildSketch(Plane(origin=(25.533684211, 0, 0), x_dir=(0, 0, -1), z_dir=(1, 0, 0))):
        with Locations((-13.782947368, 50.506)):
            Circle(SKETCH13_R)
    extrude(amount=-CUT_EXTRUDE7_DEPTH, mode=Mode.SUBTRACT)

    # Sketch15 → Cut-Extrude8 (cut)
    with BuildSketch(Plane.ZY.offset(-20.533684211)):
        Polygon((16.150083472, 46.406), (18.517219576, 50.506), (16.150083472, 54.606), (11.415811265, 54.606), (9.048675161, 50.506), (11.415811265, 46.406), align=None)
    extrude(amount=-CUT_EXTRUDE8_DEPTH, mode=Mode.SUBTRACT)

    # Sketch19 → Cut-Extrude11 (cut)
    with BuildSketch(Plane(origin=(0, 10, 0), x_dir=(1, 0, 0), z_dir=(0, 1, 0))):
        Polygon((-3.676315789, 2.857670413), (-3.676315789, 7.517950593), (-8.676315789, 7.517950593), (-8.676315789, 5.124778841), (-8.676315789, -5.990338695), (-8.676315789, -9.982049407), (-3.676315789, -9.982049407), align=None)
        with BuildLine():
            Line((-8.676315789, -5.990338695), (-8.676315789, 5.124778841))
            add(Edge.make_bspline(
                [(-8.676315789, 5.124778841), (-16.808569573, 3.725426293), (-13.469663804, -5.736672492), (-19.282893487, -9.286767458)],
                knots=[0, 0, 0, 0, 1, 1, 1, 1], degree=3))
            Line((-19.282893487, -9.286767458), (-16.121145543, -12.375890698))
            add(Edge.make_bspline(
                [(-8.676315789, -5.990338695), (-12.90644661, -5.58199058), (-13.157452533, -10.60956316), (-16.121145543, -12.375890698)],
                knots=[0, 0, 0, 0, 1, 1, 1, 1], degree=3))
        make_face()
    extrude(amount=-CUT_EXTRUDE11_DEPTH, mode=Mode.SUBTRACT)

    # Sketch20 → Boss-Extrude8 (add)
    with BuildSketch(Plane.XZ):
        with BuildLine():
            add(Edge.make_bspline(
                [(-16.121145543, 12.375890698), (-14.069186941, 11.152946562), (-13.317608867, 8.366659728), (-11.645404629, 6.903612087)],
                knots=[0, 0, 0, 0, 0.692365436, 0.692365436, 0.692365436, 0.692365436], degree=3))
            Line((-16.121145543, 12.375890698), (-19.282893487, 9.286767458))
            add(Edge.make_bspline(
                [(-13.371318098, -2.196913004), (-15.640126217, 1.283314512), (-15.162227429, 6.77030817), (-19.282893487, 9.286767458)],
                knots=[0.291157191, 0.291157191, 0.291157191, 0.291157191, 1, 1, 1, 1], degree=3))
            Line((-13.371318098, -2.196913004), (-11.645404629, 6.903612087))
        make_face()
    extrude(amount=-BOSS_EXTRUDE8_DEPTH)


solid = part.part
